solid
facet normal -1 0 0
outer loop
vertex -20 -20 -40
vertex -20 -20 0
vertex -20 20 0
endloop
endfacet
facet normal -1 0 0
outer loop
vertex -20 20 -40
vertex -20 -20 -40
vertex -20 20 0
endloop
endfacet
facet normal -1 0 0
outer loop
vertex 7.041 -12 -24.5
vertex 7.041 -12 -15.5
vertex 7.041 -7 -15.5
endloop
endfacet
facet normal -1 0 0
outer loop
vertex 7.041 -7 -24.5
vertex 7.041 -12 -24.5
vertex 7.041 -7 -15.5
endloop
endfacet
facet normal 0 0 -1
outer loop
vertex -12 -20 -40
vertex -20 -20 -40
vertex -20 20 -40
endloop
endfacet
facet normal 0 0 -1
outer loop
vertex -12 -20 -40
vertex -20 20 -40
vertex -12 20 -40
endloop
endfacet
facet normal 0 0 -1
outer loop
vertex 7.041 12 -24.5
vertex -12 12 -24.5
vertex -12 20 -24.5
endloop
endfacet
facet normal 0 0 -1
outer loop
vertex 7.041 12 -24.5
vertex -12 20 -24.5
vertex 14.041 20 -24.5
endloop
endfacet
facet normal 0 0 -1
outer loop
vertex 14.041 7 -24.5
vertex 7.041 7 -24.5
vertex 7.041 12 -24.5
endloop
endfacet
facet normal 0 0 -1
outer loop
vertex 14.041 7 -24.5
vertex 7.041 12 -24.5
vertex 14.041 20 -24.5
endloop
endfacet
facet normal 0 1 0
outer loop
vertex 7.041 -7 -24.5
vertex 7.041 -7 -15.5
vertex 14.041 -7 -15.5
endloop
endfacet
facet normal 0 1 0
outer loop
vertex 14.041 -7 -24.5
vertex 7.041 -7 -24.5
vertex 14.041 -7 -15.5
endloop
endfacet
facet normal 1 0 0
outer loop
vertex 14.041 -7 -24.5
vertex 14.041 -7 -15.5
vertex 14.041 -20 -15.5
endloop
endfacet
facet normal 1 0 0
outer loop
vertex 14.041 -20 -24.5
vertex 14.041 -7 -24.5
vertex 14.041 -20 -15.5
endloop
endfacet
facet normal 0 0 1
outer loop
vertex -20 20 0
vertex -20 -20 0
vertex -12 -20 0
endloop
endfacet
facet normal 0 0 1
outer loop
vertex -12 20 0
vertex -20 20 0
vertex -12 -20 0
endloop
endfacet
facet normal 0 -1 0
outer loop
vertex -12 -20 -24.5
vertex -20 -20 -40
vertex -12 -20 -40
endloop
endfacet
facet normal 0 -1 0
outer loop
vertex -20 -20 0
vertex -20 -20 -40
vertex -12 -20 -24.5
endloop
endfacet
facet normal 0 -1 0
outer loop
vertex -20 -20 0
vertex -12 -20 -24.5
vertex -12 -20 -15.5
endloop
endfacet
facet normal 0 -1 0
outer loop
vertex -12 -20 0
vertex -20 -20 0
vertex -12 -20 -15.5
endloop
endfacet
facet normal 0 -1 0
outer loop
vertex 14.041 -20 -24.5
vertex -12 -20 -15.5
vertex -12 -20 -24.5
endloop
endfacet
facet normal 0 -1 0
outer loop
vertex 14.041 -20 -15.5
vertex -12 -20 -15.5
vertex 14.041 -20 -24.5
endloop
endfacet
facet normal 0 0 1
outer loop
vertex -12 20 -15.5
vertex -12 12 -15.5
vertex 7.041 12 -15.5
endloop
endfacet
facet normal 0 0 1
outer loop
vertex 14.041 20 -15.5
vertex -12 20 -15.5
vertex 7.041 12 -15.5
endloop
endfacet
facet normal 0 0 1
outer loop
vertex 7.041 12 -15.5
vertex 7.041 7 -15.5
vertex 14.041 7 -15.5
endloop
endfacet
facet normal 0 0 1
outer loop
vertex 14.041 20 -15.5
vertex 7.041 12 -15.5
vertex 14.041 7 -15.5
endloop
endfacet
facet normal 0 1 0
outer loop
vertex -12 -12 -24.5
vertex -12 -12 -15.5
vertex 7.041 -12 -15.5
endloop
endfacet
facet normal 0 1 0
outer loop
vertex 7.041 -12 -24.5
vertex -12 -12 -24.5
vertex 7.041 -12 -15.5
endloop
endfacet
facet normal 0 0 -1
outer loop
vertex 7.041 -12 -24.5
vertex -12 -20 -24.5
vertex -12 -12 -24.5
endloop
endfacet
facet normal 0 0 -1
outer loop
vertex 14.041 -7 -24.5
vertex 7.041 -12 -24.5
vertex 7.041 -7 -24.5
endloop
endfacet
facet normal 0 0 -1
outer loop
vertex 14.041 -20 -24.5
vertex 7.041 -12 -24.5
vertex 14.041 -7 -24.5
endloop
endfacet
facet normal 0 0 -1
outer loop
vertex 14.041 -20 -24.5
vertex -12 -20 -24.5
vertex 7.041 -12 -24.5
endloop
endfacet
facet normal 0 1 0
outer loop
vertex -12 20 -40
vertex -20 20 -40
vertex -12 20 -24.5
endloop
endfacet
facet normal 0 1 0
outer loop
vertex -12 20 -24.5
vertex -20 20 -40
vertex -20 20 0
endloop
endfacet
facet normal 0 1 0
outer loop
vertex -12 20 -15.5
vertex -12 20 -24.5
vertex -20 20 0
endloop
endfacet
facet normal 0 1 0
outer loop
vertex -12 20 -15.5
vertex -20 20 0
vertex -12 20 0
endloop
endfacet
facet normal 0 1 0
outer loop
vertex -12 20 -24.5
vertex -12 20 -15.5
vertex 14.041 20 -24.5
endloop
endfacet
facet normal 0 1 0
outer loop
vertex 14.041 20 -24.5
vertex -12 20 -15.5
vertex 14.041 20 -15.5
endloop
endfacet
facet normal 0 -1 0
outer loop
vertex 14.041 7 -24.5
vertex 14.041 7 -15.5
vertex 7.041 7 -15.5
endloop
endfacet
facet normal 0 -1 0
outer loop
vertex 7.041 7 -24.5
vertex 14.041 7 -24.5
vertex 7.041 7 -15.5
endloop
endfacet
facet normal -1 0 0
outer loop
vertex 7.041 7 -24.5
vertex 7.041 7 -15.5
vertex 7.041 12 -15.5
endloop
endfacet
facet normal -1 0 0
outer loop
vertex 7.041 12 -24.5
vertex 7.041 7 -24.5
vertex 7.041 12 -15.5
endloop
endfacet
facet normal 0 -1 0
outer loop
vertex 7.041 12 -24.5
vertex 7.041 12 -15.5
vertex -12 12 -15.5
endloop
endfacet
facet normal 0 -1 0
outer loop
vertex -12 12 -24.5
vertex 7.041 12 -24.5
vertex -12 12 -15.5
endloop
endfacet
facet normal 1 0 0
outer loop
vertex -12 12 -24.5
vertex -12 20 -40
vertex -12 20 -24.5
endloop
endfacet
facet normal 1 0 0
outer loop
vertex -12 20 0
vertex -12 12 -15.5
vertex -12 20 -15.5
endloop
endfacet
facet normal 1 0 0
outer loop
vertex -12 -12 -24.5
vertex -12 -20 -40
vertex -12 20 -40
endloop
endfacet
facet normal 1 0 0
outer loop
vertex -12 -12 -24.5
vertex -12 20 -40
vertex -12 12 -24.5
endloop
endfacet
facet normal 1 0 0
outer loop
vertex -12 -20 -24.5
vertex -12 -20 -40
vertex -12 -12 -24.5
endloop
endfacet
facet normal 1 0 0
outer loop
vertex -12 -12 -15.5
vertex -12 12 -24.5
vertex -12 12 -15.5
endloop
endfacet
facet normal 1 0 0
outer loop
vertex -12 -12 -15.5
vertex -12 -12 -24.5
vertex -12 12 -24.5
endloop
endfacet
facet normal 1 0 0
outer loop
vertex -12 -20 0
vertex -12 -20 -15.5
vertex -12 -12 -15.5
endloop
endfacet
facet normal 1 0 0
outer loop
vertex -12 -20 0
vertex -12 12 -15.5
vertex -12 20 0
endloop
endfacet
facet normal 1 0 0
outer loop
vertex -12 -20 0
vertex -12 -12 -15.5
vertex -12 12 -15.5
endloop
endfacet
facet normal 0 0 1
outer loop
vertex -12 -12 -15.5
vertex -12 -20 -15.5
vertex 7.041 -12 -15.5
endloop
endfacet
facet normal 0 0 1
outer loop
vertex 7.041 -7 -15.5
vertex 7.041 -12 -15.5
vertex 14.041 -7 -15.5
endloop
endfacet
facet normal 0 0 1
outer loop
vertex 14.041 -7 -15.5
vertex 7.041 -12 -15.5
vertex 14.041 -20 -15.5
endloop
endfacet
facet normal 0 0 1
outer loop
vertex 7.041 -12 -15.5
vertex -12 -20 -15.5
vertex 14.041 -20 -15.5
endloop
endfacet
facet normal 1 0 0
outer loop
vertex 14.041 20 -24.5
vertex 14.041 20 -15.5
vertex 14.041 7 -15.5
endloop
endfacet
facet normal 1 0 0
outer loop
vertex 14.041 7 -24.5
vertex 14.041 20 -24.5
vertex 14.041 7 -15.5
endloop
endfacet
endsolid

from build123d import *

# Parameters (mm, degrees)
F0_W     = 40
F0_H     = 40
F1_DEPTH = 40
F4_DEPTH = 40
F3_W     = 32
F3_H     = 15.5
F5_DEPTH = 40
F6_DEPTH = 40


with BuildPart() as f1:
    # F0 (on Top) → F1 (new body)
    with BuildSketch(Plane.XY):
        Rectangle(F0_W, F0_H)
    extrude(amount=-F1_DEPTH)

    # F2 (on face) → F4 (cut)
    with BuildSketch(Plane.XY):
        Polygon((20, 20), (14.041499, 20), (14.041499, 7), (7.041499, 7), (7.041499, 12), (-12, 12), (-12, -12), (7.041499, -12), (7.041499, -7), (14.041499, -7), (14.041499, -20), (20, -20), align=None)
    extrude(amount=-F4_DEPTH, mode=Mode.SUBTRACT)

    # F3 (on face) → F5 (cut)
    with BuildSketch(Plane.XZ.offset(20)):
        with Locations((4, -7.75)):
            Rectangle(F3_W, F3_H)
    extrude(amount=-F5_DEPTH, mode=Mode.SUBTRACT)

    # F3 (on face) → F6 (cut)
    with BuildSketch(Plane.XZ.offset(20)):
        with Locations((4, -32.25)):
            Rectangle(F3_W, F3_H)
    extrude(amount=-F6_DEPTH, mode=Mode.SUBTRACT)


solid = f1.part
